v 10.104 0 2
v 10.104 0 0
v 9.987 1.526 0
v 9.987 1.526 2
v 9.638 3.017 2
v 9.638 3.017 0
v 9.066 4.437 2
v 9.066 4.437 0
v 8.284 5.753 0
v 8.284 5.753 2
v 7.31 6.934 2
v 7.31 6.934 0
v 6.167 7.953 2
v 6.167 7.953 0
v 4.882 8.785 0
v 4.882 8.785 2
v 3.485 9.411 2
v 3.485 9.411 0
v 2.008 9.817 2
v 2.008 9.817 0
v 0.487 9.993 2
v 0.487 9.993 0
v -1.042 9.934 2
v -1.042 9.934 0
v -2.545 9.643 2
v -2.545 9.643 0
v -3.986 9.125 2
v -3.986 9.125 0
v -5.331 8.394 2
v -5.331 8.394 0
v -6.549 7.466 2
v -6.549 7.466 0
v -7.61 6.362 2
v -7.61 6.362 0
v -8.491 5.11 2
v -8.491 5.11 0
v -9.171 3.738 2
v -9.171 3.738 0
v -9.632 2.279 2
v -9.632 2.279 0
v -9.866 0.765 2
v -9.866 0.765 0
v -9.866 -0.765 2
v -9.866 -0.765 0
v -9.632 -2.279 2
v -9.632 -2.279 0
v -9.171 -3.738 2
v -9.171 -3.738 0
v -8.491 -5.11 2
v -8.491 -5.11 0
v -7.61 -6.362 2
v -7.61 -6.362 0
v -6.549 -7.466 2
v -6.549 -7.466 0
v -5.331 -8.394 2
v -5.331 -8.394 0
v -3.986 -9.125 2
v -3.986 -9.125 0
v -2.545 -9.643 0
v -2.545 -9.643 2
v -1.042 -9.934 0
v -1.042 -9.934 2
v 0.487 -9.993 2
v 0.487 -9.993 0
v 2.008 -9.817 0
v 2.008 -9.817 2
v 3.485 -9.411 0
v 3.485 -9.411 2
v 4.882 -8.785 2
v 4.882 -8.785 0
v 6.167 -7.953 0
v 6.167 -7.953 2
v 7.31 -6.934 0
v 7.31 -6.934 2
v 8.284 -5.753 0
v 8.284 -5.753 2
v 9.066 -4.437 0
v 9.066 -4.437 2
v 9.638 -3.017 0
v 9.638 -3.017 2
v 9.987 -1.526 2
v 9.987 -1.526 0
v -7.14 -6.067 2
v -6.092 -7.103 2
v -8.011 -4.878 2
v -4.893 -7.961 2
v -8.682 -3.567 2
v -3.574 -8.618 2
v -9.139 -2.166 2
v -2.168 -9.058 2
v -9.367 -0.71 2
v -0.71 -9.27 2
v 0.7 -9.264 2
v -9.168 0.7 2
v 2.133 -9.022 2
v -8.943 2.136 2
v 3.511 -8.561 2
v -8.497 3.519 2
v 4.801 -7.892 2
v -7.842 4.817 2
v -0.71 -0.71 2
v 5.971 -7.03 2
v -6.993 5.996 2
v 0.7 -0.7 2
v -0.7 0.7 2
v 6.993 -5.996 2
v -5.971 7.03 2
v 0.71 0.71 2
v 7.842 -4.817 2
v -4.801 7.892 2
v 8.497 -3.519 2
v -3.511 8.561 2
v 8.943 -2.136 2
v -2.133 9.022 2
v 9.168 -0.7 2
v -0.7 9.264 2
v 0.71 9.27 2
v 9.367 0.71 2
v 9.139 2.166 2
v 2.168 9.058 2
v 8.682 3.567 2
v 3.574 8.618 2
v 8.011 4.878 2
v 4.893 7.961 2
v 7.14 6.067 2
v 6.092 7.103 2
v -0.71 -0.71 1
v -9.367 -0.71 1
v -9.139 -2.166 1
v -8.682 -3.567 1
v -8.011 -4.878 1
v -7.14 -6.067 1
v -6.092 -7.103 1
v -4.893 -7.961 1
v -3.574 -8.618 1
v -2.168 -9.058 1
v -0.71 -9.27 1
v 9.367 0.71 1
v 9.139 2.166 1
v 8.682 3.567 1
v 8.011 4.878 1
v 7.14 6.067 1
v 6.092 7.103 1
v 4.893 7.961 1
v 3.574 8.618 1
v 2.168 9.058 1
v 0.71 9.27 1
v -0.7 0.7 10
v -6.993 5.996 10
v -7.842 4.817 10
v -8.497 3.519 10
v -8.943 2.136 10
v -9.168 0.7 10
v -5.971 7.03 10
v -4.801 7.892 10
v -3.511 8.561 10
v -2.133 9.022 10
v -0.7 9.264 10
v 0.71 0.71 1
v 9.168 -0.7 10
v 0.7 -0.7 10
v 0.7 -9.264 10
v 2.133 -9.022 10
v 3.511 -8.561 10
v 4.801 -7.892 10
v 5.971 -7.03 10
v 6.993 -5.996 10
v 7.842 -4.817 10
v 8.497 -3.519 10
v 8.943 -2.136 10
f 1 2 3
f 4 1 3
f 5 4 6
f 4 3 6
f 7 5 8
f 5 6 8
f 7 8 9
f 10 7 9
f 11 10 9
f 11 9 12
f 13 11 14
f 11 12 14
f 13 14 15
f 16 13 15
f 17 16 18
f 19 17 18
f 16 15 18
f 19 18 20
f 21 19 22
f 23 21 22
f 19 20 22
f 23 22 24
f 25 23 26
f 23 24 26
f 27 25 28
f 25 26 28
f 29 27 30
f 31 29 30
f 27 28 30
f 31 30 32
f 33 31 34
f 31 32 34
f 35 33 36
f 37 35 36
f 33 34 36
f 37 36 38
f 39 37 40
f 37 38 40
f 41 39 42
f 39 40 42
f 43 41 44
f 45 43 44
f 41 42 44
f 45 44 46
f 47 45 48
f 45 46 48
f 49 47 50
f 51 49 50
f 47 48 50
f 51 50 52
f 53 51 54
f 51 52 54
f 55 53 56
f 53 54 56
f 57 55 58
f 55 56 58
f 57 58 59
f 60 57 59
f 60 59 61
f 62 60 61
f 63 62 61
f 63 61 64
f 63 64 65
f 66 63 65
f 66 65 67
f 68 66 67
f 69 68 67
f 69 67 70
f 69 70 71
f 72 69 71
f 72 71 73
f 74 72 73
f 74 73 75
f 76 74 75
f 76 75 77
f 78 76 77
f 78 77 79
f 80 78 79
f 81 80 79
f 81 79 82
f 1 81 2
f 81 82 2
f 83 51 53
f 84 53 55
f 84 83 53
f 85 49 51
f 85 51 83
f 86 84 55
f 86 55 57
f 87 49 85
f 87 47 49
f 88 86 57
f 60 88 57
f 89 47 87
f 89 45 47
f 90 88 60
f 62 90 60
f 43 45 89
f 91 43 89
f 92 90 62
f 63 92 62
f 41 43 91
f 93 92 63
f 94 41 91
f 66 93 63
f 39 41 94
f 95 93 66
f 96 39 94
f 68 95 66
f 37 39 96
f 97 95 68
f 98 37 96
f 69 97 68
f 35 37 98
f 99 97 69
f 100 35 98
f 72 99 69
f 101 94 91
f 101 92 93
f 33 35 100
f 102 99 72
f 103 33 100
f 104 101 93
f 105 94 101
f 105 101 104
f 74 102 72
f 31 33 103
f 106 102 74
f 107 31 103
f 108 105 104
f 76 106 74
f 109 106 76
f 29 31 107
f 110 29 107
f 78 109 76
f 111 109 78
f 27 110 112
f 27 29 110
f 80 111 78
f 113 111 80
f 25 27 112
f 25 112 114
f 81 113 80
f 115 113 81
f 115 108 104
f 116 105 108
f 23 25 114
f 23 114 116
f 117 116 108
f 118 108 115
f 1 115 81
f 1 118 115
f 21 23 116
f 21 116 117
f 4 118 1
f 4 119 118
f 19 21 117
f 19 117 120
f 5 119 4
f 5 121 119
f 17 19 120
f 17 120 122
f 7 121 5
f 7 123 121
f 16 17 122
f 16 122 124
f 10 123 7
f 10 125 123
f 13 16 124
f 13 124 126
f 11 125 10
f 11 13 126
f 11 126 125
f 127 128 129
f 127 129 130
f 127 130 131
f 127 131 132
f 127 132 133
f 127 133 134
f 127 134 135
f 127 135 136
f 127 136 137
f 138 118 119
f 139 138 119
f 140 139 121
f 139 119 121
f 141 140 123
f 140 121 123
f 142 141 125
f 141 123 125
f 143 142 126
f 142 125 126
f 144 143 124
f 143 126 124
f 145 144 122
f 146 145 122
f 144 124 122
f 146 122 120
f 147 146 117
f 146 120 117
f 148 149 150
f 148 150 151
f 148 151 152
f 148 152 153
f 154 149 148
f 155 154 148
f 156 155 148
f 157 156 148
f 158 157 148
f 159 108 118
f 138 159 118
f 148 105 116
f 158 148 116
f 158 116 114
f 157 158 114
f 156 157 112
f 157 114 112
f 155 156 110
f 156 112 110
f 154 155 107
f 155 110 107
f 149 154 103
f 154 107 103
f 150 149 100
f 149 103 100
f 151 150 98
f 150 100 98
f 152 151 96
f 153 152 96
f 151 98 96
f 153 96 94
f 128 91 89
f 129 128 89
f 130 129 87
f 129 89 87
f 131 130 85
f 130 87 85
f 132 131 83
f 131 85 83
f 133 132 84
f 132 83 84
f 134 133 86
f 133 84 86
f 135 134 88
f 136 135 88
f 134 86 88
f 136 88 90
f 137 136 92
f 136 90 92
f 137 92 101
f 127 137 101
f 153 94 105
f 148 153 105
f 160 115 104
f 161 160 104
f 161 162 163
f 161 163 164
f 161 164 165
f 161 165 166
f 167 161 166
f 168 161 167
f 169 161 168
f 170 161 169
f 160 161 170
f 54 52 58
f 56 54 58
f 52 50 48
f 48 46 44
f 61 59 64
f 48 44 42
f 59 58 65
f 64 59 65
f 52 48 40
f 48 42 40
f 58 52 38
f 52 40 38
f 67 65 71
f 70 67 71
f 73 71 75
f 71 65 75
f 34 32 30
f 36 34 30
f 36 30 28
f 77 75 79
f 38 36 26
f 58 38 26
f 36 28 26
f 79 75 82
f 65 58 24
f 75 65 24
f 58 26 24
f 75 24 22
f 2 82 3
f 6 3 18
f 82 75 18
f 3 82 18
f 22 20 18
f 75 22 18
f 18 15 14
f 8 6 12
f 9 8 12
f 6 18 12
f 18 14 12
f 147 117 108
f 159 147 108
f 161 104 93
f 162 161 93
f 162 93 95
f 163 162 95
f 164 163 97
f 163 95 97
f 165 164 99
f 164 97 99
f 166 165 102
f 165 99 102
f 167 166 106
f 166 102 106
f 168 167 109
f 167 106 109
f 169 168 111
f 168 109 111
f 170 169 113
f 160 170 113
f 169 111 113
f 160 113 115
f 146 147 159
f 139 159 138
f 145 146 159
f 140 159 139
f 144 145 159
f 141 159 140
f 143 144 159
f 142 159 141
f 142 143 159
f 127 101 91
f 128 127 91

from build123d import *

# Parameters (mm, degrees)
F0_R     = 10
F1_DEPTH = 2
F3_DEPTH = 8
F4_DEPTH = 1


with BuildPart() as f1:
    # F0 (on Top) → F1 (new body)
    with BuildSketch(Plane.XY):
        with Locations((0.104472, 0)):
            Circle(F0_R)
    extrude(amount=F1_DEPTH)

    # F2 (on face) → F3 (join)
    with BuildSketch(Plane.XY.offset(2)):
        with BuildLine():
            Line((0.7, -0.7), (0.7, -9.263617))
            ThreePointArc((0.7, -9.263617), (6.502526, -6.532934), (9.16764, -0.7))
            Line((9.16764, -0.7), (0.7, -0.7))
        make_face()
        with BuildLine():
            Line((-0.7, 0.7), (-0.7, 9.263617))
            ThreePointArc((-0.7, 9.263617), (-6.502526, 6.532934), (-9.16764, 0.7))
            Line((-9.16764, 0.7), (-0.7, 0.7))
        make_face()
    extrude(amount=F3_DEPTH)

    # F2 (on face) → F4 (cut)
    with BuildSketch(Plane.XY.offset(2)):
        with BuildLine():
            Line((0.71, 0.71), (9.367301, 0.71))
            ThreePointArc((9.367301, 0.71), (6.636361, 6.605947), (0.71, 9.270245))
            Line((0.71, 9.270245), (0.71, 0.71))
        make_face()
        with BuildLine():
            Line((-0.71, -0.71), (-9.367301, -0.71))
            ThreePointArc((-9.367301, -0.71), (-6.636361, -6.605947), (-0.71, -9.270245))
            Line((-0.71, -9.270245), (-0.71, -0.71))
        make_face()
    extrude(amount=-F4_DEPTH, mode=Mode.SUBTRACT)


solid = f1.part
